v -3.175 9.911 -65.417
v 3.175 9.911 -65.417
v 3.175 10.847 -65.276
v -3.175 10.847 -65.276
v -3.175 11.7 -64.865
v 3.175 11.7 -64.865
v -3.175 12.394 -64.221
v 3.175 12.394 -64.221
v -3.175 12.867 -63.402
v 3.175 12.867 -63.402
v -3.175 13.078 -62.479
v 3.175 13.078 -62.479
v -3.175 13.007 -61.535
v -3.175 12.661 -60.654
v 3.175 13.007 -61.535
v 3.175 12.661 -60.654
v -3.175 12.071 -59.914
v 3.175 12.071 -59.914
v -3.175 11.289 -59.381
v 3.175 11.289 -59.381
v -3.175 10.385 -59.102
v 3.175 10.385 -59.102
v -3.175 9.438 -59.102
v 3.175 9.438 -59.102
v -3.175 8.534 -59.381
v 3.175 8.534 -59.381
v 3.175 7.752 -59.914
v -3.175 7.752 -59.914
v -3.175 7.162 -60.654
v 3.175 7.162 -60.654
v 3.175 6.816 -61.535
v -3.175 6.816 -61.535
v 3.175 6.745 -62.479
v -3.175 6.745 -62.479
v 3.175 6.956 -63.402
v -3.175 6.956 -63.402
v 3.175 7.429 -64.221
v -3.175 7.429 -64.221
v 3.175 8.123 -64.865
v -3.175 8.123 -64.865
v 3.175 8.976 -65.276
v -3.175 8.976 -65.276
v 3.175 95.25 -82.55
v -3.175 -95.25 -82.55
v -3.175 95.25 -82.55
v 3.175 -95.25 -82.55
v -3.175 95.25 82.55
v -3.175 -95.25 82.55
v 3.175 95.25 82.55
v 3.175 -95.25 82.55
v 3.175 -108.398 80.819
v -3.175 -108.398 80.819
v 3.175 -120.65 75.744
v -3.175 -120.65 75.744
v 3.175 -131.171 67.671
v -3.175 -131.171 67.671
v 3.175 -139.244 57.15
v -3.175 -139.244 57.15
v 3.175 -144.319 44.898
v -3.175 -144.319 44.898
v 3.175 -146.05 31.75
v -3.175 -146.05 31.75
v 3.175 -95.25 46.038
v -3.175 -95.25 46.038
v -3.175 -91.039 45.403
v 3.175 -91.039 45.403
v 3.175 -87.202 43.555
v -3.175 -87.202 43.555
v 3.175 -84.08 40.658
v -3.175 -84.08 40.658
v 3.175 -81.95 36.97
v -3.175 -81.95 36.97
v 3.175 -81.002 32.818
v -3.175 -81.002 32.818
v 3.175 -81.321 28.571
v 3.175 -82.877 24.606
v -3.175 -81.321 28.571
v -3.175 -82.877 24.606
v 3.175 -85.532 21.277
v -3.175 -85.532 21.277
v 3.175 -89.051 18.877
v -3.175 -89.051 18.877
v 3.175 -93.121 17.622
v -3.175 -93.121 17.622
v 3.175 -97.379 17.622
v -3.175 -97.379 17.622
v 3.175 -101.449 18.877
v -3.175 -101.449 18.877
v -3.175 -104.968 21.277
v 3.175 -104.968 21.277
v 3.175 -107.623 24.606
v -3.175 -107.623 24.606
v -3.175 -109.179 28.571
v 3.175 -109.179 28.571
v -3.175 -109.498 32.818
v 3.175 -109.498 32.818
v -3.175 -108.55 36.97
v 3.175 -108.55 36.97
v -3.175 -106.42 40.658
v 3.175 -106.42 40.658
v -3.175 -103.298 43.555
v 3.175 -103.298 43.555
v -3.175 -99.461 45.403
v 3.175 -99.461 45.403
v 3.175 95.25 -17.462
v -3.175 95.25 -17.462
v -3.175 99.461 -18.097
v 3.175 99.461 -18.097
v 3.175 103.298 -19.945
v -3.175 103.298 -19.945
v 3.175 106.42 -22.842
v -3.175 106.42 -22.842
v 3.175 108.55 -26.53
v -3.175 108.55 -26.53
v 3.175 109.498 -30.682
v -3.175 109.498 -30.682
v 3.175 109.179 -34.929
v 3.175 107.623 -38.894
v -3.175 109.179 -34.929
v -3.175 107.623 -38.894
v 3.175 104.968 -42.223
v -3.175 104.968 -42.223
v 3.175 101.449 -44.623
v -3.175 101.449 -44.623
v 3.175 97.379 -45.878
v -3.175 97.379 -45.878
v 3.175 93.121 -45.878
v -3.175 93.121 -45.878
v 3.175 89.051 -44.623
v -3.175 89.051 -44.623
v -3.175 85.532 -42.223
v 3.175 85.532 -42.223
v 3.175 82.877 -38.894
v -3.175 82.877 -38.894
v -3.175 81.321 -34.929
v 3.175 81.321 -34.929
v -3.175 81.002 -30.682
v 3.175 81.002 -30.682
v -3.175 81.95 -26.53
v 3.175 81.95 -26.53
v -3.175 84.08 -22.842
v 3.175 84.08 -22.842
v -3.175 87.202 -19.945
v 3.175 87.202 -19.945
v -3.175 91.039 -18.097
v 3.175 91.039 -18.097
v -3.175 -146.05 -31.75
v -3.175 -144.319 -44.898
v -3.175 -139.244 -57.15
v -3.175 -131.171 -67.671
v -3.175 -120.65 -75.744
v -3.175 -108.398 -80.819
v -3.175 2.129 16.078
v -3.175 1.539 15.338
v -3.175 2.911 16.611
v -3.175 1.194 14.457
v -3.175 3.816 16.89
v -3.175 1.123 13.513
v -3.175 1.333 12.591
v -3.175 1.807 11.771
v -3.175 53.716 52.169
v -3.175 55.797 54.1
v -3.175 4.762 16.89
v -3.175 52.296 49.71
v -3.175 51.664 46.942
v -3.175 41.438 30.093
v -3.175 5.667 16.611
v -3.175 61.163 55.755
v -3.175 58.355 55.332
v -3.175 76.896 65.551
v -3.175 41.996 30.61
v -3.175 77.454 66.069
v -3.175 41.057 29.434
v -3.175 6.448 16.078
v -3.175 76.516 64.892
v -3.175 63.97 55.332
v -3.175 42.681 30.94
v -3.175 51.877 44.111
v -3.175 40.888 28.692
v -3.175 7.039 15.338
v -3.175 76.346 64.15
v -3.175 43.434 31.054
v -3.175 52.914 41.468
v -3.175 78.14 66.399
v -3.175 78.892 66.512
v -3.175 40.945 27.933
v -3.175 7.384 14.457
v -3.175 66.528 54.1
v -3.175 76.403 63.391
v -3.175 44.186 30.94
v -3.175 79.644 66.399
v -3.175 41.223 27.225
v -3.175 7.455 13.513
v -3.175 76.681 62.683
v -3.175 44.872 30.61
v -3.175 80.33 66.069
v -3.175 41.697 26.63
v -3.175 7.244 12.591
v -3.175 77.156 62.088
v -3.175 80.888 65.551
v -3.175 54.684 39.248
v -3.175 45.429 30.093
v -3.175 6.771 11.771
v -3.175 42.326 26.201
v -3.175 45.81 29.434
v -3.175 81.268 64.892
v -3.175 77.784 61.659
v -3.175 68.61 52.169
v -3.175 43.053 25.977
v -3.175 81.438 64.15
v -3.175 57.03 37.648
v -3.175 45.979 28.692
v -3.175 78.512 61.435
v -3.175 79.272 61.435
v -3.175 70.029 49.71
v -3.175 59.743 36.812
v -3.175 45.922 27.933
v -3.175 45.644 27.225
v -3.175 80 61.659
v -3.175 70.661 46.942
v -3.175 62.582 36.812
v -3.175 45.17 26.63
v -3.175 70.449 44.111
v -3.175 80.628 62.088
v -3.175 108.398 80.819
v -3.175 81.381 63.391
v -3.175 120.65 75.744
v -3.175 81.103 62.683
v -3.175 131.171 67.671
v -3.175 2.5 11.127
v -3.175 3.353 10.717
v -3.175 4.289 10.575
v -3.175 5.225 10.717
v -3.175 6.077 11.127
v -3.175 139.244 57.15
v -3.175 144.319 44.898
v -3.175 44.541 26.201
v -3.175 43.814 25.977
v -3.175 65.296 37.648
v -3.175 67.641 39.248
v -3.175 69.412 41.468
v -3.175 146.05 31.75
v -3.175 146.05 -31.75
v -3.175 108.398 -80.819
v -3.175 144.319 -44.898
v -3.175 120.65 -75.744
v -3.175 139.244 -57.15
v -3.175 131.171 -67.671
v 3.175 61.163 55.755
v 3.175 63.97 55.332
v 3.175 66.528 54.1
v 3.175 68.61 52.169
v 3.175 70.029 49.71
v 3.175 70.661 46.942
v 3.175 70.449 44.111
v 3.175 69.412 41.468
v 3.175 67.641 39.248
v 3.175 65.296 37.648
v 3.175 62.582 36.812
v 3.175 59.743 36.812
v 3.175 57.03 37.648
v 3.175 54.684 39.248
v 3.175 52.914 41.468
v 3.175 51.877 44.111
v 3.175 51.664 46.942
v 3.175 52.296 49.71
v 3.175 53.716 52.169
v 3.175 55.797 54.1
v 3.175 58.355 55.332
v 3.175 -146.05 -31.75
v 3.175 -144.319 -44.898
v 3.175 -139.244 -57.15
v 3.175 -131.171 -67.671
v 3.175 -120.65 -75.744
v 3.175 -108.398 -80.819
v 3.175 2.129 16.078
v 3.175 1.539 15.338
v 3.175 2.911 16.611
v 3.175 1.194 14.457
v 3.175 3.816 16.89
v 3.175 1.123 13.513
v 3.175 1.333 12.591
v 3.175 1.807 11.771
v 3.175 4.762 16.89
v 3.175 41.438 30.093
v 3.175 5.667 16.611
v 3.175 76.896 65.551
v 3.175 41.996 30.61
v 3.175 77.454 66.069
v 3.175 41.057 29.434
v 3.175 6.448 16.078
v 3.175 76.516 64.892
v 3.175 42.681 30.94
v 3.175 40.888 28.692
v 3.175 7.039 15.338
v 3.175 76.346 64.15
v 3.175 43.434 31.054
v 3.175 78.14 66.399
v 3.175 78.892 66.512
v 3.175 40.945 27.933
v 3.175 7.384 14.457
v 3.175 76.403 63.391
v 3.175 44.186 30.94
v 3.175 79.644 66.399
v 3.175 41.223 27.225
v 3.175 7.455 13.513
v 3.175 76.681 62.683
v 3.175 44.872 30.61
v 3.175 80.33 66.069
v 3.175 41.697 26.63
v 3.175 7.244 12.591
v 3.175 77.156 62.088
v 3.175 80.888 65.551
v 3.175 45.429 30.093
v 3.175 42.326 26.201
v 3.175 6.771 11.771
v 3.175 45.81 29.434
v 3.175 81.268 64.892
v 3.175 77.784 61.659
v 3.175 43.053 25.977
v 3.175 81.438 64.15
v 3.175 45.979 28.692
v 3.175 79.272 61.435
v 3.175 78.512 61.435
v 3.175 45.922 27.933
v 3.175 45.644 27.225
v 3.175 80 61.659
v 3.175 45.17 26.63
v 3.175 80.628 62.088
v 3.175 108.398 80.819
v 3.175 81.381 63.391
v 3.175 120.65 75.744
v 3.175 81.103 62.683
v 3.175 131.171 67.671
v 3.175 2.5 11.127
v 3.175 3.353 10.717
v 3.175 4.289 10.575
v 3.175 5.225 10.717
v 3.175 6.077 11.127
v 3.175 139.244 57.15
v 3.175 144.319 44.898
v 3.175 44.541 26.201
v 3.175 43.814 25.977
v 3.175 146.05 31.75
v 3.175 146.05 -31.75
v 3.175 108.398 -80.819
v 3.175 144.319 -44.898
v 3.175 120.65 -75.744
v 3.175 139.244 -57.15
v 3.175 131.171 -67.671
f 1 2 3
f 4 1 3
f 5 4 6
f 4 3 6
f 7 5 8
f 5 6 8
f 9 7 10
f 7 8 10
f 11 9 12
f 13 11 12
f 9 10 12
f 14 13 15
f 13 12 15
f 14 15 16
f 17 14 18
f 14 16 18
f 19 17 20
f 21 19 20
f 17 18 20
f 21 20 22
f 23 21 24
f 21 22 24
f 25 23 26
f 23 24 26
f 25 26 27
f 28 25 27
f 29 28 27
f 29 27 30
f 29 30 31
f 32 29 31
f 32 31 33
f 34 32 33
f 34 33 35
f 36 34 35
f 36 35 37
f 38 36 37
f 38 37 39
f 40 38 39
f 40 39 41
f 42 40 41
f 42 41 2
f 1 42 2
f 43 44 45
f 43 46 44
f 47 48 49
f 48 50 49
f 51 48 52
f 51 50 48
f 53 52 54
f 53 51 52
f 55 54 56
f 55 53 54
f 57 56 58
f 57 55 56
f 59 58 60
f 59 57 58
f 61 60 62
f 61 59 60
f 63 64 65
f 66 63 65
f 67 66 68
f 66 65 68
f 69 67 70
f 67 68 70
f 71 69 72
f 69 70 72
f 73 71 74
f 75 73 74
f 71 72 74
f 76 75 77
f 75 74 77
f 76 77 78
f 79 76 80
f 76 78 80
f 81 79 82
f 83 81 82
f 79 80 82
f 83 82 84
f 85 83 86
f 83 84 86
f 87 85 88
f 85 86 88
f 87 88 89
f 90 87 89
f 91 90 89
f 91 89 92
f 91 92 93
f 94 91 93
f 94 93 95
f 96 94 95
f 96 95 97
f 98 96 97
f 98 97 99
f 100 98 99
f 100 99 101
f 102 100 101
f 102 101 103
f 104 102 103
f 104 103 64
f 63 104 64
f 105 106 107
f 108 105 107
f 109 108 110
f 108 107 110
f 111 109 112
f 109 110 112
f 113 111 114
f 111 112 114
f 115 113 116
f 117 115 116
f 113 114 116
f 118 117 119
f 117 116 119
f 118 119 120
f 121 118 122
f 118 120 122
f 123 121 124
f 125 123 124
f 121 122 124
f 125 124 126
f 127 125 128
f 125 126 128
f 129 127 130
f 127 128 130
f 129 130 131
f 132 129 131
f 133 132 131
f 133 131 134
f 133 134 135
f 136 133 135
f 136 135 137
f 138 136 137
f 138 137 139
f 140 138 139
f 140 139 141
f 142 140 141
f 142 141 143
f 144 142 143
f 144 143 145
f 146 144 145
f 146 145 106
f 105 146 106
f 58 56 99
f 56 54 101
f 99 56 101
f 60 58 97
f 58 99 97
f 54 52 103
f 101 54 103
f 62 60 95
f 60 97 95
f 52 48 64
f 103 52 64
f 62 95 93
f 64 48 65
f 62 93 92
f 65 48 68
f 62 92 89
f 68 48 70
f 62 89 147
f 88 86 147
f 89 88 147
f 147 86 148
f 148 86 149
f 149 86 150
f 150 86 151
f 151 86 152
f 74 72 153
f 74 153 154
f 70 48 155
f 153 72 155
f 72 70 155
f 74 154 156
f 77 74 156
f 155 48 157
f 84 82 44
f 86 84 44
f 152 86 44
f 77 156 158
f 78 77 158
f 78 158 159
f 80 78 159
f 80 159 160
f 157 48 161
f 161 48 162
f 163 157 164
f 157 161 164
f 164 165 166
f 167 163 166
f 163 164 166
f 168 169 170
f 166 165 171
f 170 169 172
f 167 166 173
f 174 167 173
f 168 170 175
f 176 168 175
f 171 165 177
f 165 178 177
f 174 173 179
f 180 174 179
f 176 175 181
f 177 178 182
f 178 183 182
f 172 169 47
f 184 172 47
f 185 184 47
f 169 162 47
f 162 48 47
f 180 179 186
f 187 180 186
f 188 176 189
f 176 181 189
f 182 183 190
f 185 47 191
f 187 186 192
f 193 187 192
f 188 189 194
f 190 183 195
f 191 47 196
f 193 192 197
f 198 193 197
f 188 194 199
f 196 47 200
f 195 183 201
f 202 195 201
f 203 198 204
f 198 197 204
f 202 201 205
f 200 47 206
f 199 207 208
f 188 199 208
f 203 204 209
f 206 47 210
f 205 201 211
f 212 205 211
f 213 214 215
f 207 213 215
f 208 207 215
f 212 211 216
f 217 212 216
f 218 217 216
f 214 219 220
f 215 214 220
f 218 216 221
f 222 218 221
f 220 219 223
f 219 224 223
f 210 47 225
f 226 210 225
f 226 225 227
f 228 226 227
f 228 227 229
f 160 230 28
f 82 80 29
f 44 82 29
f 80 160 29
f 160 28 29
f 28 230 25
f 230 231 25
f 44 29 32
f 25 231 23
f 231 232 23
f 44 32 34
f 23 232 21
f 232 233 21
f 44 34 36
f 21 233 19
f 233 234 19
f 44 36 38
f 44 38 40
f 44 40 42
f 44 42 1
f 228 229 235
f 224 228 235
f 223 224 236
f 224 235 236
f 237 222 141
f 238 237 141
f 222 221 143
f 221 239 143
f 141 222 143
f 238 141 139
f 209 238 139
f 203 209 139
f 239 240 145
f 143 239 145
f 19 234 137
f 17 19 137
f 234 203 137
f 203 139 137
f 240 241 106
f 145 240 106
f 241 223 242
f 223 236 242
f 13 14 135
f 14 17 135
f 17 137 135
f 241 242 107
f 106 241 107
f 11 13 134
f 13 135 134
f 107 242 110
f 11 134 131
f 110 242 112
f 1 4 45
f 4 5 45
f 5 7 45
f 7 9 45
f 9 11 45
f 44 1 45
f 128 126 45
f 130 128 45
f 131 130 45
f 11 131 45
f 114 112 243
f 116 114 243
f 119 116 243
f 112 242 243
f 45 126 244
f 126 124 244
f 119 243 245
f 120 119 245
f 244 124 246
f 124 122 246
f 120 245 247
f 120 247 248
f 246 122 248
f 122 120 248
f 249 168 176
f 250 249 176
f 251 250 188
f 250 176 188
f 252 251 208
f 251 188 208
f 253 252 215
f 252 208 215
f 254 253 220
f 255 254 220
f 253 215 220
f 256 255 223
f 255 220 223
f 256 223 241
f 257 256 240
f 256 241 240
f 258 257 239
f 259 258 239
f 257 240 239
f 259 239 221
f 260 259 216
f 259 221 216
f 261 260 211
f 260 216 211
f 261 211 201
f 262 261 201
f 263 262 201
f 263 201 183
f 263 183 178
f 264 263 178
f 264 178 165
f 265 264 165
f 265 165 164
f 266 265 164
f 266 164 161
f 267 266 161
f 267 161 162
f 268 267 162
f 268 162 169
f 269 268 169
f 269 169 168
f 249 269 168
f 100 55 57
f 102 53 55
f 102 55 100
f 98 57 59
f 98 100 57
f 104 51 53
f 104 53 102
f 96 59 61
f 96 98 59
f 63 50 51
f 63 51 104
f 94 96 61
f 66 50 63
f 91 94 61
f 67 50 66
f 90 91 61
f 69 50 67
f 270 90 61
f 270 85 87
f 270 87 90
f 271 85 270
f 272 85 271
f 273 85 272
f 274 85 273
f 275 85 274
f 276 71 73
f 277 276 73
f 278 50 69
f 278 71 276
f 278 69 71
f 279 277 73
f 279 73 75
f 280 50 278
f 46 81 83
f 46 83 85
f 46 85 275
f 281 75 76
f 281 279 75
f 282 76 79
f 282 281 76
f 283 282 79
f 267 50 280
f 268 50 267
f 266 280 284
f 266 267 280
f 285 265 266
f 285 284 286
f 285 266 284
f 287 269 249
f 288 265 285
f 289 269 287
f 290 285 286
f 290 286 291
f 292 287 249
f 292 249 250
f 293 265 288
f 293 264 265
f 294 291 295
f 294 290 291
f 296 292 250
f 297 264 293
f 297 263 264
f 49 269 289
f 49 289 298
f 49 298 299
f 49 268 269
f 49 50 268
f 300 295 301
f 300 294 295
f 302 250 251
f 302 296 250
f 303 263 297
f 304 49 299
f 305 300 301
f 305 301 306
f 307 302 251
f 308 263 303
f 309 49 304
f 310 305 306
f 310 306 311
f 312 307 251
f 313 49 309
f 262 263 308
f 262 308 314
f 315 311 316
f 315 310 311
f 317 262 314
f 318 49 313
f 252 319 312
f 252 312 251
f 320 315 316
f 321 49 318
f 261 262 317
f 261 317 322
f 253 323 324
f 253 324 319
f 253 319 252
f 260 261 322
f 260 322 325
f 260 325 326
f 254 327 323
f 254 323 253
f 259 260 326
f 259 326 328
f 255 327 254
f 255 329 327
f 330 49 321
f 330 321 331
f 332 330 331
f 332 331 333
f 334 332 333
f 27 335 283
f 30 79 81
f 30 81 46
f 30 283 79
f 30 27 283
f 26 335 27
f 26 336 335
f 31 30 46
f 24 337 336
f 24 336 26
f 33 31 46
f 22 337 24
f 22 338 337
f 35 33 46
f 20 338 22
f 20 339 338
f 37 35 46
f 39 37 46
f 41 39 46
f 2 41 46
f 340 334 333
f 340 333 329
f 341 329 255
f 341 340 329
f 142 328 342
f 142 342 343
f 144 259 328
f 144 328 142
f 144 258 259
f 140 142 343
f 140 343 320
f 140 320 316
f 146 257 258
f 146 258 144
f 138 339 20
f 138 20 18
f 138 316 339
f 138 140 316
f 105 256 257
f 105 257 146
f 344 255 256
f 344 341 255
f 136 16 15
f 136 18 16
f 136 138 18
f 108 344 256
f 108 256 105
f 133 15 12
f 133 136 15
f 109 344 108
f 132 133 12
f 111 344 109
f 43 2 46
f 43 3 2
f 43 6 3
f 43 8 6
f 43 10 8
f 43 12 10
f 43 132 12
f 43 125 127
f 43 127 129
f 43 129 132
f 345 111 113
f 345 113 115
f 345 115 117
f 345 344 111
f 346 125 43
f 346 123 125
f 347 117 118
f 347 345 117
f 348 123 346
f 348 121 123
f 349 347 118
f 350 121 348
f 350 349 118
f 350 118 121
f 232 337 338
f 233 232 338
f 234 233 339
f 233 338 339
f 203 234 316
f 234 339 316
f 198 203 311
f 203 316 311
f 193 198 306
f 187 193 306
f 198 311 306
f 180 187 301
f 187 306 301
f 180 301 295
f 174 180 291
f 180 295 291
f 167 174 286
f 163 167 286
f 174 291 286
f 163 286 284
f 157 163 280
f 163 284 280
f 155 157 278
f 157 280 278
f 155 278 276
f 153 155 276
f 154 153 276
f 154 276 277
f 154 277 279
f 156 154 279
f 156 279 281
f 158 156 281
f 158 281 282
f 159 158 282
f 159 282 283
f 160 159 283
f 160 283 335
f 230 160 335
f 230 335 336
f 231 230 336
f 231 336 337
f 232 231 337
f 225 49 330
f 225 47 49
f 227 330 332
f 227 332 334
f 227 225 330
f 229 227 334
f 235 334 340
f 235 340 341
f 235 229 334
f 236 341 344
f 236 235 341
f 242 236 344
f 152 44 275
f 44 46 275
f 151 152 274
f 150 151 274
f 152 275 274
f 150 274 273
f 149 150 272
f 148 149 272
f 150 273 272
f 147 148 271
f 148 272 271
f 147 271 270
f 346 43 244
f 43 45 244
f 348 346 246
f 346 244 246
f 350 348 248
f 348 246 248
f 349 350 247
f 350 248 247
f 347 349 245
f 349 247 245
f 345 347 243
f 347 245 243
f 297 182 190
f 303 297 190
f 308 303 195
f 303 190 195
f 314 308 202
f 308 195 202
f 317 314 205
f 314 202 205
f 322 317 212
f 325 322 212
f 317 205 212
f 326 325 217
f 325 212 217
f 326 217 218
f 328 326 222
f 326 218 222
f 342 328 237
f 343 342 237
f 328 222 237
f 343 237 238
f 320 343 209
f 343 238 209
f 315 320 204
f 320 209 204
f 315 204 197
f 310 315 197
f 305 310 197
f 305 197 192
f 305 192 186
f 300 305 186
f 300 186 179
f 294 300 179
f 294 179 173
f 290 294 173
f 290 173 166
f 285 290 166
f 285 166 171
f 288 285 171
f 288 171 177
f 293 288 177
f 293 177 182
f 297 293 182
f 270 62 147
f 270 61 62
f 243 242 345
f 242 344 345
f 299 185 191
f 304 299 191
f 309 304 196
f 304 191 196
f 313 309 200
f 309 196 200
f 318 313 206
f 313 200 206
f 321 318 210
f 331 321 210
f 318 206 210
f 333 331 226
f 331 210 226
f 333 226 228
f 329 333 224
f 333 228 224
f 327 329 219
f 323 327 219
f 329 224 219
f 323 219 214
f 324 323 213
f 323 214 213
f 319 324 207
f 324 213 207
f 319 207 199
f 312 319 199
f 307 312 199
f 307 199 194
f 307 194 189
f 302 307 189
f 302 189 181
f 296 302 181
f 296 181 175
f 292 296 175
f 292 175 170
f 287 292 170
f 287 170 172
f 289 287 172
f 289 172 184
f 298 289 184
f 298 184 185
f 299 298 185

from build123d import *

# Parameters (mm, degrees)
SKETCH1_W           = 165.1
SKETCH1_H           = 292.1
BOSS_EXTRUDE1_DEPTH = 3.175
FILLET1_R           = 50.8
SKETCH2_R           = 14.2875
CUT_EXTRUDE1_DEPTH  = 7.35
SKETCH4_R           = 3.175
CUT_EXTRUDE3_DEPTH  = 7.35
SKETCH5_R           = 9.525
SKETCH5_R_2         = 2.5527
CUT_EXTRUDE4_DEPTH  = 7.35


with BuildPart() as part:
    # Sketch1 → Boss-Extrude1 (new body, symmetric)
    with BuildSketch(Plane(origin=(0, 0, 0), x_dir=(0, 0, -1), z_dir=(1, 0, 0))):
        Rectangle(SKETCH1_W, SKETCH1_H)
    extrude(amount=BOSS_EXTRUDE1_DEPTH, both=True)

    # Fillet1
    fillet1_edges = [part.edges().sort_by_distance(p)[0] for p in [
        (0, -146.05, -82.55),
        (0, -146.05, 82.55),
        (0, 146.05, 82.55),
        (0, 146.05, -82.55),
    ]]
    fillet(fillet1_edges, radius=FILLET1_R)

    # Sketch2 → Cut-Extrude1 (cut, through all)
    with BuildSketch(Plane.ZY.offset(3.175)):
        with Locations((31.75, -95.25)):
            Circle(SKETCH2_R)
        with Locations((-31.75, 95.25)):
            Circle(SKETCH2_R)
    extrude(amount=-CUT_EXTRUDE1_DEPTH, mode=Mode.SUBTRACT)

    # Sketch4 → Cut-Extrude3 (cut, through all)
    with BuildSketch(Plane(origin=(3.175, 0, 0), x_dir=(0, 0, -1), z_dir=(1, 0, 0))):
        with Locations((62.241799111, 9.91138566)):
            Circle(SKETCH4_R)
        with Locations((-13.750490704, 4.288940581)):
            Circle(SKETCH4_R)
    extrude(amount=-CUT_EXTRUDE3_DEPTH, mode=Mode.SUBTRACT)

    # Sketch5 → Cut-Extrude4 (cut, through all)
    with BuildSketch(Plane.ZY.offset(3.175)):
        with Locations((46.230164374, 61.162830951)):
            Circle(SKETCH5_R)
        with Locations((63.959364374, 78.892030951)):
            Circle(SKETCH5_R_2)
        with Locations((28.500964374, 43.433630951)):
            Circle(SKETCH5_R_2)
    extrude(amount=-CUT_EXTRUDE4_DEPTH, mode=Mode.SUBTRACT)


solid = part.part
